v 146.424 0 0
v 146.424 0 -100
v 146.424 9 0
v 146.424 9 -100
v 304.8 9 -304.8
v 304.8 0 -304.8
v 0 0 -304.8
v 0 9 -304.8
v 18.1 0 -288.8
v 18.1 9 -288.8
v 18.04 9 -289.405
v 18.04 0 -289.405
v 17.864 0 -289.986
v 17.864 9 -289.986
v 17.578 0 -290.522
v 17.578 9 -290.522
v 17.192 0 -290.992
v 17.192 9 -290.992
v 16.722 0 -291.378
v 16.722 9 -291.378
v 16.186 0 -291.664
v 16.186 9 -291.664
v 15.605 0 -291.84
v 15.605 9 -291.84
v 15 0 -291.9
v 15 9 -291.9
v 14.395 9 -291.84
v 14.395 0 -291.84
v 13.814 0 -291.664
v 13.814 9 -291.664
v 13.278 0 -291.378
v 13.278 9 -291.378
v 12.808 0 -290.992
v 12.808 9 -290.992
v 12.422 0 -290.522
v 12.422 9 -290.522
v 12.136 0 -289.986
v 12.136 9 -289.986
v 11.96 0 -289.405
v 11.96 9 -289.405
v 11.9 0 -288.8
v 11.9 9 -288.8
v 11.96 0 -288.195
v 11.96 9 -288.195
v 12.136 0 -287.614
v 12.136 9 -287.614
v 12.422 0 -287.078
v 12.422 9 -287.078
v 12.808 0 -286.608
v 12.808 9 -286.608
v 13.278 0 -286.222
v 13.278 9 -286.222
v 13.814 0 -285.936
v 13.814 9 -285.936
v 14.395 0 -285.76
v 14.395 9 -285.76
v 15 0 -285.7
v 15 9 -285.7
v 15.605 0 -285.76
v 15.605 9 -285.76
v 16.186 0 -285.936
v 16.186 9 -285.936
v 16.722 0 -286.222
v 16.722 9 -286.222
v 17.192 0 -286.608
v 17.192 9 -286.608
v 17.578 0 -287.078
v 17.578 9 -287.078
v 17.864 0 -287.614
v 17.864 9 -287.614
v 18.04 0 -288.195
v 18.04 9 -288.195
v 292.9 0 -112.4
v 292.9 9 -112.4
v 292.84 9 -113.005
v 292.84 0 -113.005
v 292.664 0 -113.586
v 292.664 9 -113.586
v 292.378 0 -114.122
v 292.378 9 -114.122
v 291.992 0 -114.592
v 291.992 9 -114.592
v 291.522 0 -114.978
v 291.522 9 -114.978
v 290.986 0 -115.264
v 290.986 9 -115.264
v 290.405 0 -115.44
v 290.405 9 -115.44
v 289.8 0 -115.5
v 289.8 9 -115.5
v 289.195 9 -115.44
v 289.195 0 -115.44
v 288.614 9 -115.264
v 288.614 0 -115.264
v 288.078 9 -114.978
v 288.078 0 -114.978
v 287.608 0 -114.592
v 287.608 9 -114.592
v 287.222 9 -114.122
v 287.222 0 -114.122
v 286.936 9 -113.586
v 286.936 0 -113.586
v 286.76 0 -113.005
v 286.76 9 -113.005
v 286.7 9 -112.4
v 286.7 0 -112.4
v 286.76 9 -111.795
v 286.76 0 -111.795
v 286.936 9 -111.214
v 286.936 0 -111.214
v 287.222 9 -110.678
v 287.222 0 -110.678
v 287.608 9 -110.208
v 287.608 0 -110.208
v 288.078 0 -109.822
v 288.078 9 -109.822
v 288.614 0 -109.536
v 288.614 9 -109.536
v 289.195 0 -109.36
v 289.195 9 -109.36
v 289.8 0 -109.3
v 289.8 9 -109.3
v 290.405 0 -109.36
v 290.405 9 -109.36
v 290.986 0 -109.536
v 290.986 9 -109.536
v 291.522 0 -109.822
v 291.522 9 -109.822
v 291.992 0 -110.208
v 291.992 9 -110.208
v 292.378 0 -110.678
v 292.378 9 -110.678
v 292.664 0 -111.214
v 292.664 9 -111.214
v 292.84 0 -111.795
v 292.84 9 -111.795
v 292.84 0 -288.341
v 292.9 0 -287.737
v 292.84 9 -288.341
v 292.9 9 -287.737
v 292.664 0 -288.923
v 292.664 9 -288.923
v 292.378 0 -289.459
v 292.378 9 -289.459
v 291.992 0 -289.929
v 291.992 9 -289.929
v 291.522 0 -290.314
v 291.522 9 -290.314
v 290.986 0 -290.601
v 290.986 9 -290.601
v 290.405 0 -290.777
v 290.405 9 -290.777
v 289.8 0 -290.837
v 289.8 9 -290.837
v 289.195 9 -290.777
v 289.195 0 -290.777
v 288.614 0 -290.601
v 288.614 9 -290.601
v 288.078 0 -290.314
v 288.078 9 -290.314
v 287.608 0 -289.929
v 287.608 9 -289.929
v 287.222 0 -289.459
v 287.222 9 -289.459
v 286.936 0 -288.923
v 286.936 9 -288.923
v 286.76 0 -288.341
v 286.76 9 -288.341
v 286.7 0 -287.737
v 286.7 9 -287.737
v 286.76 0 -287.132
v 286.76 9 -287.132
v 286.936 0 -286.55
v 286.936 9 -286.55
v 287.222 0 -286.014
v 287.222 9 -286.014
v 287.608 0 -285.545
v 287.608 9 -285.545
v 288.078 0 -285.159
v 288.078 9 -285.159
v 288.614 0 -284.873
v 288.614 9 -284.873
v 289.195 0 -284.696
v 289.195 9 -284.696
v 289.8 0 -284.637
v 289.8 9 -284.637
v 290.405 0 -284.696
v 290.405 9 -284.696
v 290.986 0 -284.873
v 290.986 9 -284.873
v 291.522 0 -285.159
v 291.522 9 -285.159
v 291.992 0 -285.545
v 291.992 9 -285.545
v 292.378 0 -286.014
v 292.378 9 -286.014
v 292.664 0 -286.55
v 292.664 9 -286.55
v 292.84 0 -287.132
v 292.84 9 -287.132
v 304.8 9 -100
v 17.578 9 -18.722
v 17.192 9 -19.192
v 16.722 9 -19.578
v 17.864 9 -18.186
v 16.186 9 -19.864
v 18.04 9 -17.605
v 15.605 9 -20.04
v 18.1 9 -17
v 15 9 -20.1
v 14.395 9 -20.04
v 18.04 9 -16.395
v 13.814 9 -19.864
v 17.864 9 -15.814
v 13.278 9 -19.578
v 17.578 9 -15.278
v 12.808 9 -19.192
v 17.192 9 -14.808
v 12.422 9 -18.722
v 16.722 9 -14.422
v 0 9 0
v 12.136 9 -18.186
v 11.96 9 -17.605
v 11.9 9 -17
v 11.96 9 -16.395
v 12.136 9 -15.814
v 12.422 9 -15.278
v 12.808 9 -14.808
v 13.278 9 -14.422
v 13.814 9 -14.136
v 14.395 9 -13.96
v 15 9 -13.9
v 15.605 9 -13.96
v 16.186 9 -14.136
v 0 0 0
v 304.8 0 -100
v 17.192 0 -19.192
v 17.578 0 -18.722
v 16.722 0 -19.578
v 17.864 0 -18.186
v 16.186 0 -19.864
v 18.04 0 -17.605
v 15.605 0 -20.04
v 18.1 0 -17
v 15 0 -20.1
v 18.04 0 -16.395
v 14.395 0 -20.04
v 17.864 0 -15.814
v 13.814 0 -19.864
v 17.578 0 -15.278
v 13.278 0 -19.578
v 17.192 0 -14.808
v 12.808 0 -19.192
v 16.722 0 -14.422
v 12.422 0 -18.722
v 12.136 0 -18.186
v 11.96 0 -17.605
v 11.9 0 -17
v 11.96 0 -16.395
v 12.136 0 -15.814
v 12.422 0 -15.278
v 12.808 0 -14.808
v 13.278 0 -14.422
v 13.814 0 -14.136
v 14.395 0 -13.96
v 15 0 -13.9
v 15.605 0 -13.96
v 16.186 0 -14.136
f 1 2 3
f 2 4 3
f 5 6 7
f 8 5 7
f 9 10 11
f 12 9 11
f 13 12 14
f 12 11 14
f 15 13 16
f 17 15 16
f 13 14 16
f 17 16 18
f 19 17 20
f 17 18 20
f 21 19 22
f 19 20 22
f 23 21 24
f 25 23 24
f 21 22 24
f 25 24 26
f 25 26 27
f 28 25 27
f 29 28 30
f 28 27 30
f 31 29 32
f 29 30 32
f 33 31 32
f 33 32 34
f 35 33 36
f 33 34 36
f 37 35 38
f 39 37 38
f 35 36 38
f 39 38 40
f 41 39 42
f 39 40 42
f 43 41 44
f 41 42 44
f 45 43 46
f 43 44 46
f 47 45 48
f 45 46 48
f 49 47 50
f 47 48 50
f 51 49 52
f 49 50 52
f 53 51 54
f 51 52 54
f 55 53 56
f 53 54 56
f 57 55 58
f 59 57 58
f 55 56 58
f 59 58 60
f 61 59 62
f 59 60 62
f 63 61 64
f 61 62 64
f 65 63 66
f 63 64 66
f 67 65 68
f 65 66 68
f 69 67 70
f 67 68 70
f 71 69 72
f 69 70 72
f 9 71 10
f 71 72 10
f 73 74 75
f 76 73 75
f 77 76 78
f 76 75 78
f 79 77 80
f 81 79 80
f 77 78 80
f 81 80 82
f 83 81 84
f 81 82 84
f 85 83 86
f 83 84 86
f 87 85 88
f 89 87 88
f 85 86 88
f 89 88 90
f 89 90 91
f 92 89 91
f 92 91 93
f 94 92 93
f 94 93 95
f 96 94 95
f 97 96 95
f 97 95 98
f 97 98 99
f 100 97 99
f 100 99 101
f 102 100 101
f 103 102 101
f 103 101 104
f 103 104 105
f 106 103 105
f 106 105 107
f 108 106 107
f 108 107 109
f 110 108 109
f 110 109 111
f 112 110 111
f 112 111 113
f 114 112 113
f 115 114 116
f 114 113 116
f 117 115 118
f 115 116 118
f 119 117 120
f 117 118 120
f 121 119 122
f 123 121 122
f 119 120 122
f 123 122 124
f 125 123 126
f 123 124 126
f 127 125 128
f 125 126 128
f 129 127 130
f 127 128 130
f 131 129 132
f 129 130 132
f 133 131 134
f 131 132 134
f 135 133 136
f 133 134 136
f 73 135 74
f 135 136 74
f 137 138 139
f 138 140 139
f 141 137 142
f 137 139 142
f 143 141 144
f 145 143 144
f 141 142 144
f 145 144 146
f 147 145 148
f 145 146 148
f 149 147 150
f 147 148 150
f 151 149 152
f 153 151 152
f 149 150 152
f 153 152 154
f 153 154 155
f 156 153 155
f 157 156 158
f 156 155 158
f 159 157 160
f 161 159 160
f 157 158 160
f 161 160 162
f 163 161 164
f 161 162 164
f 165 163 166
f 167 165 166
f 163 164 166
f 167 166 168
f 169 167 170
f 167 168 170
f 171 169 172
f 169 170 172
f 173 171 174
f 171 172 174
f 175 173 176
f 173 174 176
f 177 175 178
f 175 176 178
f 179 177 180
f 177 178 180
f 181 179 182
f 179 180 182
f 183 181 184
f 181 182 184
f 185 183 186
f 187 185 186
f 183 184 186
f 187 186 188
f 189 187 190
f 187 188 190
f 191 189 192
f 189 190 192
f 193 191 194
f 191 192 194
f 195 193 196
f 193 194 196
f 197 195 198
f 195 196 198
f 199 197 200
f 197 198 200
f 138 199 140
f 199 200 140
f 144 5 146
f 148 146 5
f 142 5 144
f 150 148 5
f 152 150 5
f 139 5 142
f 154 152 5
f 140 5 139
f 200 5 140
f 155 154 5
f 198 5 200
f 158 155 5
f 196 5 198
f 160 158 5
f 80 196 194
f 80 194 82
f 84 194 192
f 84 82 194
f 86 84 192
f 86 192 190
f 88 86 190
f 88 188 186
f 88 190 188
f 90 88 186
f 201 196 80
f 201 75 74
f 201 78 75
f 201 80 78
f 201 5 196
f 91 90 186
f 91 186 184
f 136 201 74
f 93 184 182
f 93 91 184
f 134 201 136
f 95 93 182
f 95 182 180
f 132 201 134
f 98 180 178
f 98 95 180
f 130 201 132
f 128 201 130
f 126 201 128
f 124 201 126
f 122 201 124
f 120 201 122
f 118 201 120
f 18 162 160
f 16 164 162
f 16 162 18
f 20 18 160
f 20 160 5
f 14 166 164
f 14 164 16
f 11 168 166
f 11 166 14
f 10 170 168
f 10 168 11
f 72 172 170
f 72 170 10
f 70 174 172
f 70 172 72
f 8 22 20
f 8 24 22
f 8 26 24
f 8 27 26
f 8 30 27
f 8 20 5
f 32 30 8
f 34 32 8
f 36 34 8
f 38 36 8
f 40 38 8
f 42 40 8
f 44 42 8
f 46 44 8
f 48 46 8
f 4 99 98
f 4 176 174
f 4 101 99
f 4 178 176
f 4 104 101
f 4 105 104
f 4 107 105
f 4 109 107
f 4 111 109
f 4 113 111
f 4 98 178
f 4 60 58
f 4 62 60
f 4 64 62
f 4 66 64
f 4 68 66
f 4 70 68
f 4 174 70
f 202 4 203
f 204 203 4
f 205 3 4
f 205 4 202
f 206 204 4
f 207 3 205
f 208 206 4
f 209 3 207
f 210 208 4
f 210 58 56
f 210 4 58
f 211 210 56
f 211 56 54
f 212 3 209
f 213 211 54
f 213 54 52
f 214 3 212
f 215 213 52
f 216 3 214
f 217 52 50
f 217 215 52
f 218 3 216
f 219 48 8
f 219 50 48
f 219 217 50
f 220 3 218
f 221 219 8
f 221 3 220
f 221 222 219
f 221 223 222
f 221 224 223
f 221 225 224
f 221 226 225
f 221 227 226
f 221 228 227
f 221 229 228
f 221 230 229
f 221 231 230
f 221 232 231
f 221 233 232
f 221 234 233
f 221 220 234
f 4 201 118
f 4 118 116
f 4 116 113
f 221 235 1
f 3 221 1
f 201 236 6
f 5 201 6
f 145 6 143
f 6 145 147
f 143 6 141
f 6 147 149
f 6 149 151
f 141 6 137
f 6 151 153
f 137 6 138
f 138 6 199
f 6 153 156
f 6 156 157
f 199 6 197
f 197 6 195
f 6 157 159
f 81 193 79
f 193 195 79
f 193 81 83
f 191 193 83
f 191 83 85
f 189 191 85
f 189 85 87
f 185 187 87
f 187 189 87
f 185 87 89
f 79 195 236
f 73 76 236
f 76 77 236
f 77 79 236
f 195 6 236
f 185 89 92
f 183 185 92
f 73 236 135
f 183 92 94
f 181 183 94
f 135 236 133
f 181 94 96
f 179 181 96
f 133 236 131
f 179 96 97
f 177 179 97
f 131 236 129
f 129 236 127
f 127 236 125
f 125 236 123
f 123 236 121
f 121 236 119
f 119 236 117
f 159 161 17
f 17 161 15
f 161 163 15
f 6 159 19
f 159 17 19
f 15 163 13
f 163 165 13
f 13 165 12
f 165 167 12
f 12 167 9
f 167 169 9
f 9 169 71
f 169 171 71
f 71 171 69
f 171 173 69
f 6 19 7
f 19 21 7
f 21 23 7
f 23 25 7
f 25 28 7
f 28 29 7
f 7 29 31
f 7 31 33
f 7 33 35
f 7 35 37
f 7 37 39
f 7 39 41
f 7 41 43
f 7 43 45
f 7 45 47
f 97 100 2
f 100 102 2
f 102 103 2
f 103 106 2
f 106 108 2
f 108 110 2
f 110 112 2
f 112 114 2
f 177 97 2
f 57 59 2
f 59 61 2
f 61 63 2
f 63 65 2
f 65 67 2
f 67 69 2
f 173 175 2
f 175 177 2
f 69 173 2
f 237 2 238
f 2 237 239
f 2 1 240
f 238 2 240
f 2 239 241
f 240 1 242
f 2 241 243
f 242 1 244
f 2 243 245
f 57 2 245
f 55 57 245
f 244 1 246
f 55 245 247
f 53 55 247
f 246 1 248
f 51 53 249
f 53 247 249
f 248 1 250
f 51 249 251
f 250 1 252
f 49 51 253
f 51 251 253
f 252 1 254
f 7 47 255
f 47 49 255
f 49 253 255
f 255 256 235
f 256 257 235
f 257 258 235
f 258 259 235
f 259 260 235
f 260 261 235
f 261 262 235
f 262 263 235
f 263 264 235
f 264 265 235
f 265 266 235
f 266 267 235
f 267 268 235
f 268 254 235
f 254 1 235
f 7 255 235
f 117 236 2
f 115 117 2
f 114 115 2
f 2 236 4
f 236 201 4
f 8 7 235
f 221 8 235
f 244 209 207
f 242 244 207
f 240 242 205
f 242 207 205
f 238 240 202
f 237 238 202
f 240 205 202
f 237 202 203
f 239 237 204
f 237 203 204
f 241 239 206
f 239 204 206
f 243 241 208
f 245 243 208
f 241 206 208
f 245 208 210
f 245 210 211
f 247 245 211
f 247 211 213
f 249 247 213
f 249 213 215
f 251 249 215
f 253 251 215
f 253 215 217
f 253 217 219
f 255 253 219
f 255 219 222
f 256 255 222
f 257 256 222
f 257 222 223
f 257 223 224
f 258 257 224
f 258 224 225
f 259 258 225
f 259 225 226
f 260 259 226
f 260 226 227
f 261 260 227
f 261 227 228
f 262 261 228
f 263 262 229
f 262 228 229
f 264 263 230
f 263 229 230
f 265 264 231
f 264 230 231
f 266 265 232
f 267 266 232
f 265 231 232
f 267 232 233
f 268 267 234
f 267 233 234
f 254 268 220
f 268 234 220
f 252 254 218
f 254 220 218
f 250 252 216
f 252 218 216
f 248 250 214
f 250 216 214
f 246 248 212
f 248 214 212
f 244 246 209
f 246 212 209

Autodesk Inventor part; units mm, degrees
ref_plane "YZ Plane" through (0, 0, 0) normal (1, 0, 0) x (0, 1, 0)
ref_plane "XZ Plane" through (0, 0, 0) normal (0, 1, 0) x (-1, 0, 0)
ref_plane "XY Plane" through (0, 0, 0) normal (0, 0, 1) x (1, 0, 0)
sketch "Sketch1" plane through (0, 0, 0) normal (0, 1, 0) x (-1, 0, 0)
  line L0 (0, 0) -> (-304.8, 0)
  line L1 (-304.8, 0) -> (-304.8, -304.8)
  line L2 (-304.8, -304.8) -> (0, -304.8)
  line L3 (0, -304.8) -> (0, 0)
  dimension "d0" = 304.8
  dimension "d1" = 304.8
extrude "Extrusion1" add sketch "Sketch1" along normal blind 9
sketch "Sketch3" plane through (0, 9, 0) normal (0, 1, 0) x (1, 0, 0)
  line L0 (197.0873, 95) -> (302.0873, 95) projected
  line L1 (302.0873, 18.175) -> (197.0873, 18.175) projected
  line L2 (153.4243, 27.425) -> (153.4243, 72.575) projected
  line L3 (304.8, 0) -> (304.8, 304.8) projected
  line L4 (304.8, 100) -> (146.4243, 100)
  line L5 (146.4243, 100) -> (146.4243, 0)
  line L6 (146.4243, 0) -> (304.8, 0)
  line L7 (304.8, 0) -> (304.8, 100)
  point P0 (0, 0)
  dimension "d8" = 5
  dimension "d9" = 7
extrude "Extrusion3" cut sketch "Sketch3" against normal blind 10
sketch "Sketch4" plane through (0, 9, 0) normal (0, 1, 0) x (1, 0, 0)
  circle A0 centre (15, 17) radius 3.1 projected
  circle A1 centre (15, 288.8) radius 3.1 projected
  circle A2 centre (289.8, 287.7367) radius 3.1 projected
  circle A3 centre (289.8, 112.4) radius 3.1 projected
  point P0 (0, 0)
extrude "Extrusion4" cut sketch "Sketch4" against normal through all
sketch "Sketch2" plane through (0, 9, 0) normal (0, 1, 0) x (1, 0, 0)
  line L0 (304.8, 304.8) -> (0, 304.8) projected
  line L1 (304.8, 304.8) -> (144.8, 304.8)
  line L2 (144.8, 304.8) -> (144.8, 209.8)
  line L3 (144.8, 209.8) -> (304.8, 209.8)
  line L4 (304.8, 209.8) -> (304.8, 304.8)
  point P0 (0, 0)
  dimension "d4" = 95
  dimension "d5" = 160
properties part number "acrylic_cover"
